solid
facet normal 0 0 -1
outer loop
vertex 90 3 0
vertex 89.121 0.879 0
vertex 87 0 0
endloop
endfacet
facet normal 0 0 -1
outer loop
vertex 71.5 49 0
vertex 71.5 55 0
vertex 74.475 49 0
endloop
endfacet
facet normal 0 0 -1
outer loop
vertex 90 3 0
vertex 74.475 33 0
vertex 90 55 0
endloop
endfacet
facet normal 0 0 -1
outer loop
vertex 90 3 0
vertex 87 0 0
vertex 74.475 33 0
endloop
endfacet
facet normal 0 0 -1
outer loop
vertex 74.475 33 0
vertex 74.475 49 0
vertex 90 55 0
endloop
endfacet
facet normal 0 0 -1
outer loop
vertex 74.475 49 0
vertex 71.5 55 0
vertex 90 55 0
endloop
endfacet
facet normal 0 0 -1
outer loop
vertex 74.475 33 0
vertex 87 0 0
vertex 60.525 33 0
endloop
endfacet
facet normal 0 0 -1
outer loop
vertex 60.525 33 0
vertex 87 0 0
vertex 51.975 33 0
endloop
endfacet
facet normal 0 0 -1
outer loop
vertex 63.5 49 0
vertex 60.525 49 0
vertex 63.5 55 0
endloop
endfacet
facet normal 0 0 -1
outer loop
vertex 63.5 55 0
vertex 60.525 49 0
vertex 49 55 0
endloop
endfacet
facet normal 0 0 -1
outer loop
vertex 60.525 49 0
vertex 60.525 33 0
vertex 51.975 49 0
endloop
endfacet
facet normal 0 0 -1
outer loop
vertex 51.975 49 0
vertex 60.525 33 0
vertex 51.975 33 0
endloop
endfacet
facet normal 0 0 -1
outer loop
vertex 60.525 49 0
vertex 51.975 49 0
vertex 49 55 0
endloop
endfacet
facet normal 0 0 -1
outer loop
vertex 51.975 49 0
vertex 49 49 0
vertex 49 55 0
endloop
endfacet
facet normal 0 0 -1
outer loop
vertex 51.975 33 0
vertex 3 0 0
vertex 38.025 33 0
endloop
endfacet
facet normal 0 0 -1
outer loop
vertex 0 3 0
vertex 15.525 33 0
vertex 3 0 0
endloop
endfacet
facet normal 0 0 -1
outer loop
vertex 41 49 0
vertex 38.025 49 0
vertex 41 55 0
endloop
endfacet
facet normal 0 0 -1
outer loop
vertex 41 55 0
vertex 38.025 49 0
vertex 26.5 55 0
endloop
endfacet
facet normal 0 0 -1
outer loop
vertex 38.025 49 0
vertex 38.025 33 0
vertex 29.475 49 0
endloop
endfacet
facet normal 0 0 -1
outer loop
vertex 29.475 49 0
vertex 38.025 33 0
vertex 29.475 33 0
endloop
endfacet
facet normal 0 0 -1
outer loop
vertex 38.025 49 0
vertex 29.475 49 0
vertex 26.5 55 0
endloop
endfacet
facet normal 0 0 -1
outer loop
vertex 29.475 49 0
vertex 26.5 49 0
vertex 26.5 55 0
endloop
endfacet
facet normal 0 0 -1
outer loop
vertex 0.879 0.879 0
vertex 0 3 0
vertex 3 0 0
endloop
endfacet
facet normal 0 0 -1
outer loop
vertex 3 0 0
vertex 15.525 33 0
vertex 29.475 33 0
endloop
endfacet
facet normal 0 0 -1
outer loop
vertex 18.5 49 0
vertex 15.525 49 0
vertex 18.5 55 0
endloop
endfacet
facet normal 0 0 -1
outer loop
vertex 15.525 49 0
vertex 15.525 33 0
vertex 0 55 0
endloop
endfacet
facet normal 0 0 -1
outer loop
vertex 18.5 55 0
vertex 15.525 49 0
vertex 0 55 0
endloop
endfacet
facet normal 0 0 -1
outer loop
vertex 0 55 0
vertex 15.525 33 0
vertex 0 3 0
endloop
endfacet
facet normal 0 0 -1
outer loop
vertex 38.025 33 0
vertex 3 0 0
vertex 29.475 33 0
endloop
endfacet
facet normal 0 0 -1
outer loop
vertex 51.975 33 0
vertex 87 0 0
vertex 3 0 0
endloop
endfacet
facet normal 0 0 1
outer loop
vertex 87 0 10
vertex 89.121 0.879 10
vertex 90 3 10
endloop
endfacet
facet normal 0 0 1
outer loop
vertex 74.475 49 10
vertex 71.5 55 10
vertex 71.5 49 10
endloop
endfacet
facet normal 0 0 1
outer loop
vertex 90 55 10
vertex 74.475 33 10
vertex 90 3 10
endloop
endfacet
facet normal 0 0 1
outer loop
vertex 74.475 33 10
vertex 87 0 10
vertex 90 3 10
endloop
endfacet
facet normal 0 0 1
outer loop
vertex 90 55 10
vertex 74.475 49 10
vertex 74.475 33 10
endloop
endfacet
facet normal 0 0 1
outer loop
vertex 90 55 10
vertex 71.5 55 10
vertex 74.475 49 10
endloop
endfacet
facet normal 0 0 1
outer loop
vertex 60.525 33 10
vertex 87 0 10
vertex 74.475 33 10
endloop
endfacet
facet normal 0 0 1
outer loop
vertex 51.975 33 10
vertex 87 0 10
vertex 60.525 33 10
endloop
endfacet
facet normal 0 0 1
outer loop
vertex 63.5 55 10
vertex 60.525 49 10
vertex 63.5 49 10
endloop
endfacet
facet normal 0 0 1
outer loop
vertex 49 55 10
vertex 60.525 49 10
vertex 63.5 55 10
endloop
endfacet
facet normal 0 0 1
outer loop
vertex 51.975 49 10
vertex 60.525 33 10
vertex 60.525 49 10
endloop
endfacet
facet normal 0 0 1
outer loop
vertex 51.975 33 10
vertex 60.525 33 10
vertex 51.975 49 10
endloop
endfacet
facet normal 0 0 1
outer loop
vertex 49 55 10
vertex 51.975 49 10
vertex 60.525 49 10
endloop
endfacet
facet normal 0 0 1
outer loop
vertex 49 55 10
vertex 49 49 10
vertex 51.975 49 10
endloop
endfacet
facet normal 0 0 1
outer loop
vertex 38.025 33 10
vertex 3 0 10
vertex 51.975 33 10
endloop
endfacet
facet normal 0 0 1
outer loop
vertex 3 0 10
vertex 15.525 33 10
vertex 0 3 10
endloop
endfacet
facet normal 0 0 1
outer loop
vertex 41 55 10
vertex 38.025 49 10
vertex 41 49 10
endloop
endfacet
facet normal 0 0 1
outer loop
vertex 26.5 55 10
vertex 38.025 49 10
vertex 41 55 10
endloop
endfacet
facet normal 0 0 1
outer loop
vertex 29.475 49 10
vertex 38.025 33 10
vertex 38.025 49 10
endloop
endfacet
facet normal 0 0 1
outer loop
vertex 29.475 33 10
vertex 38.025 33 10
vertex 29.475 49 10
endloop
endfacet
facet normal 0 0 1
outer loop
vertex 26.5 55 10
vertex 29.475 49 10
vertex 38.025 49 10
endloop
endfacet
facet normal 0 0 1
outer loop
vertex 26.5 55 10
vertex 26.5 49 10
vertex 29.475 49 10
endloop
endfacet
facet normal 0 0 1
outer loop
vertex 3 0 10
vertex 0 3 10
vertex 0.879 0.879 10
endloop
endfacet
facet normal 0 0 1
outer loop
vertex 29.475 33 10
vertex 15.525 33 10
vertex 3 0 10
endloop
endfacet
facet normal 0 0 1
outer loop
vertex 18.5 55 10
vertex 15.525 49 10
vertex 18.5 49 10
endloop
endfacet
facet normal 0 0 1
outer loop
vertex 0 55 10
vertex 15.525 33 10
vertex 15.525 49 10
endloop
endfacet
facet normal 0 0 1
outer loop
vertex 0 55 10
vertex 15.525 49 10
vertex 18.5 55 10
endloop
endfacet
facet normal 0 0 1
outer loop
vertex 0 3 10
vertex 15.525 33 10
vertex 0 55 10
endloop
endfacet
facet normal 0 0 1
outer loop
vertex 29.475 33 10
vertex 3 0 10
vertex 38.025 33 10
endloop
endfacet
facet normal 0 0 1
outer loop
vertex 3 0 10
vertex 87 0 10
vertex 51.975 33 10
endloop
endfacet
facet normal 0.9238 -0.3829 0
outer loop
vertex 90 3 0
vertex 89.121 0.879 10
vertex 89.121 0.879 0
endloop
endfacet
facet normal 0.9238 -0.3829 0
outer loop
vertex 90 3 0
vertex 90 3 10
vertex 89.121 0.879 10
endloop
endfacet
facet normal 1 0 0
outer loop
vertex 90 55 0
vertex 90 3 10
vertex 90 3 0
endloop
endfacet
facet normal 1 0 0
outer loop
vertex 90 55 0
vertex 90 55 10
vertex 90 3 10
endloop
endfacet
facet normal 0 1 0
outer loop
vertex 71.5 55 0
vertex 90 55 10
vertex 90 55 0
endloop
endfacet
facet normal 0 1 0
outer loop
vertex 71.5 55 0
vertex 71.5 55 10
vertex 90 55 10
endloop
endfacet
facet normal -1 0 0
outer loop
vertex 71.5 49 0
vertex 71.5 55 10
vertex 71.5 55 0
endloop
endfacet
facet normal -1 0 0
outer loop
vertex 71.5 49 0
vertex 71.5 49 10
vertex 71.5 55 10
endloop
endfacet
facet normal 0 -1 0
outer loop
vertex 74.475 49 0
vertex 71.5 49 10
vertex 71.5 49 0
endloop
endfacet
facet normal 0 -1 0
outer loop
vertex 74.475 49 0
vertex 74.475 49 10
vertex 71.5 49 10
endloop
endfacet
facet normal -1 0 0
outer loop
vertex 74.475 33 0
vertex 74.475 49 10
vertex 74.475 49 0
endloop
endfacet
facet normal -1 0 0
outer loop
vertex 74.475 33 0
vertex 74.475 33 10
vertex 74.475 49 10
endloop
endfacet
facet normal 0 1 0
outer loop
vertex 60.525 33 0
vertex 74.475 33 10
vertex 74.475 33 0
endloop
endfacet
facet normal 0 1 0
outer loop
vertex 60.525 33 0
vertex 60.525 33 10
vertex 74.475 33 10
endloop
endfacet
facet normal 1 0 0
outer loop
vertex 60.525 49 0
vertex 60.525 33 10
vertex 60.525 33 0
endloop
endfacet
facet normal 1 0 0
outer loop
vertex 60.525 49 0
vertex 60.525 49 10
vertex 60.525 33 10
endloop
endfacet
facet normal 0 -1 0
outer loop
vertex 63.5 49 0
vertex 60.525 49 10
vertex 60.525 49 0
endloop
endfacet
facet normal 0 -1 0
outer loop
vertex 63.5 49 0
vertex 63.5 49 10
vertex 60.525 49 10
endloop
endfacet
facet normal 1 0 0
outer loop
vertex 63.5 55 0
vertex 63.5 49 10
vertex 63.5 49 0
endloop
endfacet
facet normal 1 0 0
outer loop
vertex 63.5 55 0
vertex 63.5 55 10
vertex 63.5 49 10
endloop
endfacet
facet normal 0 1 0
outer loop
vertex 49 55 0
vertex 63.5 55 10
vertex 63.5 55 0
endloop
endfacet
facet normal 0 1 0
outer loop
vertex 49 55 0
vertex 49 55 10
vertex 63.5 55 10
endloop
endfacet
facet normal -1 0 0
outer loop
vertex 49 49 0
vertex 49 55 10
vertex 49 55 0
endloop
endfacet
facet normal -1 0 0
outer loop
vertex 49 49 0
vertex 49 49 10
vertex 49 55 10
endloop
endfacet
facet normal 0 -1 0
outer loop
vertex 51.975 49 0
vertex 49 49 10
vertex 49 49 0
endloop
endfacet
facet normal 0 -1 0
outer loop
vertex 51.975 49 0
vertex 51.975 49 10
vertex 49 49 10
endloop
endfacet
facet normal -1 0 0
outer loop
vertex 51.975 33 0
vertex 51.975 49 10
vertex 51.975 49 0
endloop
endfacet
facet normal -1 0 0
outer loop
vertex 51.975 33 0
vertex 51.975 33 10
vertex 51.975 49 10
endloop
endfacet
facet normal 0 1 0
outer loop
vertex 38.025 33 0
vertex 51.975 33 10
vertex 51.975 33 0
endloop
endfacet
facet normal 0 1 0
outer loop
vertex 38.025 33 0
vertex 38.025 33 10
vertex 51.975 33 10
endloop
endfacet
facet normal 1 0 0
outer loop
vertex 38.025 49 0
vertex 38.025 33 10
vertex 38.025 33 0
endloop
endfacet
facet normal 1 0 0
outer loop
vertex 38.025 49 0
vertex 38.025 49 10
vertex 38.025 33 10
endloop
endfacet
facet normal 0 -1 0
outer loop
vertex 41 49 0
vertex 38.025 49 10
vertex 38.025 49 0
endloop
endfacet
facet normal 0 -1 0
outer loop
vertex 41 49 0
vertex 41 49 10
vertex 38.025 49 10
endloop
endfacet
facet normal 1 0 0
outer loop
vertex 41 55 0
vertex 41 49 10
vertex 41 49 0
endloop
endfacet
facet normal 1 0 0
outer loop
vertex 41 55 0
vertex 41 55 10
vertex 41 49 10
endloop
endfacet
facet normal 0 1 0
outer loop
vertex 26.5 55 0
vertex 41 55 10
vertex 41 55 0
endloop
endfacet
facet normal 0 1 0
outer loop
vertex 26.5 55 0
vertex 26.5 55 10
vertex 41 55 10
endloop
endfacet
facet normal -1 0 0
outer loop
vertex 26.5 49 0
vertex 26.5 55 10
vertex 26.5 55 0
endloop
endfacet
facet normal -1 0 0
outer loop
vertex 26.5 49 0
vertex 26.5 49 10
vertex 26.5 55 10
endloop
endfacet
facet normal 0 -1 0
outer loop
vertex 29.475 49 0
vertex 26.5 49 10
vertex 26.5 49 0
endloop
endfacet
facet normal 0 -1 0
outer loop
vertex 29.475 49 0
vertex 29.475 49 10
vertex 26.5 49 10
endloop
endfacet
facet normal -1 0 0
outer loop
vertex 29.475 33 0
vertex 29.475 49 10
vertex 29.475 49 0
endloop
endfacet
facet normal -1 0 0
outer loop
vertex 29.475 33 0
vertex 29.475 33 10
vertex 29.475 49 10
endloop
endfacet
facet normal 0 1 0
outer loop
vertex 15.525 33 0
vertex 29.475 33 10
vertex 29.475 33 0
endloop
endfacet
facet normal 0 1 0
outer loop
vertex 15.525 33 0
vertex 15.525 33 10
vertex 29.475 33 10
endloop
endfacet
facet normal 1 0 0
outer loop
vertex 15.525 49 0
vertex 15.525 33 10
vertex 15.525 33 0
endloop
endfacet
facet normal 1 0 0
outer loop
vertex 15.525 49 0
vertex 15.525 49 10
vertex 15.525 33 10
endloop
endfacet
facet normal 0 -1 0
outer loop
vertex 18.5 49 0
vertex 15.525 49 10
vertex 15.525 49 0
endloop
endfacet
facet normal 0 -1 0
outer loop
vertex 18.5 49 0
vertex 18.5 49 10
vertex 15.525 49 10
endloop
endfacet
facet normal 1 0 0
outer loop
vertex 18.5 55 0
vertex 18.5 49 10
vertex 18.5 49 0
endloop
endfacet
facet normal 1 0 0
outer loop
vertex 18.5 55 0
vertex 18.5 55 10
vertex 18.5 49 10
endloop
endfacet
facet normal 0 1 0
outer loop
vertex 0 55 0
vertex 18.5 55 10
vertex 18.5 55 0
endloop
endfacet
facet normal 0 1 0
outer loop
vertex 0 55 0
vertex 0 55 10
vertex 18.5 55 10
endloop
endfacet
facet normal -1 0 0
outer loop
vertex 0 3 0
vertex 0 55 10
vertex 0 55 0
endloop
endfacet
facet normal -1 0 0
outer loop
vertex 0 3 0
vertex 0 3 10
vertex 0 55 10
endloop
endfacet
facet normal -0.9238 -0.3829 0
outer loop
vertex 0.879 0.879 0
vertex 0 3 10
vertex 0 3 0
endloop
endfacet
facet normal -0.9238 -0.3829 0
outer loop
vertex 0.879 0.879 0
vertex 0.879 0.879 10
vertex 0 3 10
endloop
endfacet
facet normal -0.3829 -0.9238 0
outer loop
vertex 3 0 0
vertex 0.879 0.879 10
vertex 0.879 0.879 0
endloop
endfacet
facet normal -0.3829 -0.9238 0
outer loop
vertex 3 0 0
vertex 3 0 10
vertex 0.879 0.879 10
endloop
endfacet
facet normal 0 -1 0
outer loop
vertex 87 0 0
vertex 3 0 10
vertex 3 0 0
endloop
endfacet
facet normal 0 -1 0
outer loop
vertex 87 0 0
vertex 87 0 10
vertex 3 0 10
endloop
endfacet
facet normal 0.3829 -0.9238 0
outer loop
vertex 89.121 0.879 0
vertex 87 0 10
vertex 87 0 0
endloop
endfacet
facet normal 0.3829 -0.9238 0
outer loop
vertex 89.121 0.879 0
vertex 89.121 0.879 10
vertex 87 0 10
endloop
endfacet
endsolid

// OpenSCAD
$fn = 32;

// ----------------------------------------------------------------------
// Window plate: 90 x 55 mm, 3 open windows
// ----------------------------------------------------------------------

// --- parameters (mm) ---
profile_height = 10;      // extrusion height
profile_points = 32;      // points of the closed outline

profile = [[0, 3], [0.879, 0.879], [3, 0], [87, 0], [89.121, 0.879], [90, 3], [90, 55], [71.5, 55], [71.5, 49], [74.475, 49], [74.475, 33], [60.525, 33], [60.525, 49], [63.5, 49], [63.5, 55], [49, 55], [49, 49], [51.975, 49], [51.975, 33], [38.025, 33], [38.025, 49], [41, 49], [41, 55], [26.5, 55], [26.5, 49], [29.475, 49], [29.475, 33], [15.525, 33], [15.525, 49], [18.5, 49], [18.5, 55], [0, 55]];  // single closed polygon, 32 points, counter clockwise

// --- the one profile operation ---
linear_extrude(height = profile_height) polygon(points = profile);
